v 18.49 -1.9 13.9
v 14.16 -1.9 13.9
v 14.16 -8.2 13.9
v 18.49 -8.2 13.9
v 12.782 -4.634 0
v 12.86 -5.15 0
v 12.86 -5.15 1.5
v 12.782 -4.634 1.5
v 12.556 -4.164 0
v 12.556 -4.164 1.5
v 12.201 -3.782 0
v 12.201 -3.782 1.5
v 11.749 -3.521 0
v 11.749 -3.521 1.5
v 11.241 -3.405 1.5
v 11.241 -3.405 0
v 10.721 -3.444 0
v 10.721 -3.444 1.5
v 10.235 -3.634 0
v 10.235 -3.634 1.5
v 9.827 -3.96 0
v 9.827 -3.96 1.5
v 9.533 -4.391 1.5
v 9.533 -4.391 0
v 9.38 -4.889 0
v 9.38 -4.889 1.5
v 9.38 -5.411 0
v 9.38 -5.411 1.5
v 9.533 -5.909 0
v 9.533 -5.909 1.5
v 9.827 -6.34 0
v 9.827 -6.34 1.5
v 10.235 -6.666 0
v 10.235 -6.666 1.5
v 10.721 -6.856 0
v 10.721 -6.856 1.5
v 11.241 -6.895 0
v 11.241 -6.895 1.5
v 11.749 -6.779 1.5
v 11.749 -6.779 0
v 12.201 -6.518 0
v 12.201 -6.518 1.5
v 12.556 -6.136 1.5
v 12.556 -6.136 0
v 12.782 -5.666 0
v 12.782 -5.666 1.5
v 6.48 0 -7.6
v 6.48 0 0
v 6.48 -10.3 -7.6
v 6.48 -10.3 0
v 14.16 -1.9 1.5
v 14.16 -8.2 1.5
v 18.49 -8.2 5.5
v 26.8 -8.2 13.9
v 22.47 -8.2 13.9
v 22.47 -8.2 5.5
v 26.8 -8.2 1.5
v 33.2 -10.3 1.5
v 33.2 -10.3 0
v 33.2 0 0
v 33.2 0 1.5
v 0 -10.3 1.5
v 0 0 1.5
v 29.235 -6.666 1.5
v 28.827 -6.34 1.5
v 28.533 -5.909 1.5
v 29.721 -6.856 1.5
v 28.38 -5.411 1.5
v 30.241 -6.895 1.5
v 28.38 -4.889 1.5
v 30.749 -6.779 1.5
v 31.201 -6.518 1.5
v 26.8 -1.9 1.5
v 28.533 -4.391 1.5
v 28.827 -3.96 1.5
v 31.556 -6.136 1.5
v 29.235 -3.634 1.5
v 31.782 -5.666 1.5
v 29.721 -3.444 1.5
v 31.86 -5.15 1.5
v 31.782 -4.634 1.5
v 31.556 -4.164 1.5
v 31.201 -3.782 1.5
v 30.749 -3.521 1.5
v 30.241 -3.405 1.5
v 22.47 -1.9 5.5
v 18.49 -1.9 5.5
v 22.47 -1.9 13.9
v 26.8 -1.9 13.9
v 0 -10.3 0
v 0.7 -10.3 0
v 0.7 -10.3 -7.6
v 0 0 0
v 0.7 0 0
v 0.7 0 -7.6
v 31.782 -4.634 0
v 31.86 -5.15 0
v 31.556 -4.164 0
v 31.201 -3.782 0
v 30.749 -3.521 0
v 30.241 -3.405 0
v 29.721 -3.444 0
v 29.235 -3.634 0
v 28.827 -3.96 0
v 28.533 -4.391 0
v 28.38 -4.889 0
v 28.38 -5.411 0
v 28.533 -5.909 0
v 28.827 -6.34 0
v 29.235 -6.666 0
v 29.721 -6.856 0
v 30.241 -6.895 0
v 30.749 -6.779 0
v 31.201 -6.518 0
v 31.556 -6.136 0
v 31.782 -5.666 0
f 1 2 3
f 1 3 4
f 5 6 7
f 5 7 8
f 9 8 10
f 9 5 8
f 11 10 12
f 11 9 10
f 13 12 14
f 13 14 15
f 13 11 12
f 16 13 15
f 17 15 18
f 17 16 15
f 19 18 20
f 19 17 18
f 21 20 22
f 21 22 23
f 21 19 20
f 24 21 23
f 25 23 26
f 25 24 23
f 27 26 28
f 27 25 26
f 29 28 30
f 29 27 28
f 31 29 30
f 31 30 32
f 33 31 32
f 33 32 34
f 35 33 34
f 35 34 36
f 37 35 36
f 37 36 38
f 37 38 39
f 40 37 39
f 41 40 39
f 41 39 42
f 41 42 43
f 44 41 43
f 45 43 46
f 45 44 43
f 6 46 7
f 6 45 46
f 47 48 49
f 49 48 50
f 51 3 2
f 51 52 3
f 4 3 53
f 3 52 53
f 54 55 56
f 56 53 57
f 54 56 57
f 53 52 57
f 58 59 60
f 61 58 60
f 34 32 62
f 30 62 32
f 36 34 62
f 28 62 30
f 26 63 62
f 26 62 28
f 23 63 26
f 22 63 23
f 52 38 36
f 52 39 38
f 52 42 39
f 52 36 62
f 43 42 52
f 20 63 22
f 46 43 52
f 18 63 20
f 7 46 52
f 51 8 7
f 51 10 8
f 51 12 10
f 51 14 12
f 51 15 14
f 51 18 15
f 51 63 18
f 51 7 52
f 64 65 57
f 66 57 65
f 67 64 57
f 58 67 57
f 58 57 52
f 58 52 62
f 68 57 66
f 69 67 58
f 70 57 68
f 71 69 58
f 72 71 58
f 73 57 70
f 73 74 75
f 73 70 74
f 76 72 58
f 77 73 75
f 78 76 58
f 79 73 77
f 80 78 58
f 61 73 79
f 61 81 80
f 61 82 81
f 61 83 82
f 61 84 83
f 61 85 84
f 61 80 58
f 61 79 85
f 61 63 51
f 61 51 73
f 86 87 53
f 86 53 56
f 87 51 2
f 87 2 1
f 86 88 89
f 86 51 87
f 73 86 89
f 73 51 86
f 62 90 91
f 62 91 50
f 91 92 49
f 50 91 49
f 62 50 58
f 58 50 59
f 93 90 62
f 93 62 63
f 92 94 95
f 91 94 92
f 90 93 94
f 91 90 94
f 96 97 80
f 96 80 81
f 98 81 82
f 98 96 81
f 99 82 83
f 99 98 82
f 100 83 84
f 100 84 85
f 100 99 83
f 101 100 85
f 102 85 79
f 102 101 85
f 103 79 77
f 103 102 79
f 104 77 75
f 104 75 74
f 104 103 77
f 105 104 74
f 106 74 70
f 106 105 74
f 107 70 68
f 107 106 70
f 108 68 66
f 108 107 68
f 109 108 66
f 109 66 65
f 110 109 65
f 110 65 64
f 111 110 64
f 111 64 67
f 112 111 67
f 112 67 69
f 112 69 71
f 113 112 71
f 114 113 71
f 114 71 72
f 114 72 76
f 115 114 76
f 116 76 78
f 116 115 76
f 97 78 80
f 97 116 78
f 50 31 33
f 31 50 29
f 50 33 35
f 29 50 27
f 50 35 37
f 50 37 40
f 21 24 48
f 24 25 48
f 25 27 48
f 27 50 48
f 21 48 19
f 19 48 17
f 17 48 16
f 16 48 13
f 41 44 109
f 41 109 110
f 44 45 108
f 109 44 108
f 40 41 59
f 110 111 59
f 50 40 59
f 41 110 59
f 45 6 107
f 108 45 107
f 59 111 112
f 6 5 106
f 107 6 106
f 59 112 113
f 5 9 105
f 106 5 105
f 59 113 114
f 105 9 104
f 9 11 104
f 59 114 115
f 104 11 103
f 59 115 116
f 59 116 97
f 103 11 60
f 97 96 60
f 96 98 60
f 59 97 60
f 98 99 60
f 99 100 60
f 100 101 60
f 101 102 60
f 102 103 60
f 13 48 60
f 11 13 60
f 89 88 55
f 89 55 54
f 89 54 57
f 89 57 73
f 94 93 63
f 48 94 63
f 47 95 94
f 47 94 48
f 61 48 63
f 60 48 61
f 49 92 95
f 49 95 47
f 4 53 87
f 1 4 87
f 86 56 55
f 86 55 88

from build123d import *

# Parameters (mm, degrees)
F0_W     = 33.2
F0_H     = 10.3
F0_R     = 1.75
F1_DEPTH = 1.5
F2_W     = 12.64
F2_H     = 6.3
F3_DEPTH = 4
F4_W     = 4.33
F4_H     = 6.3
F5_DEPTH = 8.4
F6_W     = 5.78
F6_H     = 10.3
F7_DEPTH = 7.6


with BuildPart() as f1:
    # F0 (on Top) → F1 (new body)
    with BuildSketch(Plane.XY):
        with Locations((16.6, -5.15)):
            Rectangle(F0_W, F0_H)
        with Locations((11.11, -5.15)):
            Circle(F0_R, mode=Mode.SUBTRACT)
        with Locations((30.11, -5.15)):
            Circle(F0_R, mode=Mode.SUBTRACT)
    extrude(amount=F1_DEPTH)

    # F2 (on face) → F3 (join)
    with BuildSketch(Plane.XY.offset(1.5)):
        with Locations((20.48, -5.05)):
            Rectangle(F2_W, F2_H)
    extrude(amount=F3_DEPTH)

    # F4 (on face) → F5 (join)
    with BuildSketch(Plane.XY.offset(5.5)):
        with Locations((16.325, -5.05)):
            Rectangle(F4_W, F4_H)
        with Locations((24.635, -5.05)):
            Rectangle(F4_W, F4_H)
    extrude(amount=F5_DEPTH)

    # F6 (on face) → F7 (join)
    with BuildSketch(Plane(origin=(0, 0, 0), x_dir=(1, 0, 0), z_dir=(0, 0, -1))):
        with Locations((3.59, 5.15)):
            Rectangle(F6_W, F6_H)
    extrude(amount=F7_DEPTH)


solid = f1.part
